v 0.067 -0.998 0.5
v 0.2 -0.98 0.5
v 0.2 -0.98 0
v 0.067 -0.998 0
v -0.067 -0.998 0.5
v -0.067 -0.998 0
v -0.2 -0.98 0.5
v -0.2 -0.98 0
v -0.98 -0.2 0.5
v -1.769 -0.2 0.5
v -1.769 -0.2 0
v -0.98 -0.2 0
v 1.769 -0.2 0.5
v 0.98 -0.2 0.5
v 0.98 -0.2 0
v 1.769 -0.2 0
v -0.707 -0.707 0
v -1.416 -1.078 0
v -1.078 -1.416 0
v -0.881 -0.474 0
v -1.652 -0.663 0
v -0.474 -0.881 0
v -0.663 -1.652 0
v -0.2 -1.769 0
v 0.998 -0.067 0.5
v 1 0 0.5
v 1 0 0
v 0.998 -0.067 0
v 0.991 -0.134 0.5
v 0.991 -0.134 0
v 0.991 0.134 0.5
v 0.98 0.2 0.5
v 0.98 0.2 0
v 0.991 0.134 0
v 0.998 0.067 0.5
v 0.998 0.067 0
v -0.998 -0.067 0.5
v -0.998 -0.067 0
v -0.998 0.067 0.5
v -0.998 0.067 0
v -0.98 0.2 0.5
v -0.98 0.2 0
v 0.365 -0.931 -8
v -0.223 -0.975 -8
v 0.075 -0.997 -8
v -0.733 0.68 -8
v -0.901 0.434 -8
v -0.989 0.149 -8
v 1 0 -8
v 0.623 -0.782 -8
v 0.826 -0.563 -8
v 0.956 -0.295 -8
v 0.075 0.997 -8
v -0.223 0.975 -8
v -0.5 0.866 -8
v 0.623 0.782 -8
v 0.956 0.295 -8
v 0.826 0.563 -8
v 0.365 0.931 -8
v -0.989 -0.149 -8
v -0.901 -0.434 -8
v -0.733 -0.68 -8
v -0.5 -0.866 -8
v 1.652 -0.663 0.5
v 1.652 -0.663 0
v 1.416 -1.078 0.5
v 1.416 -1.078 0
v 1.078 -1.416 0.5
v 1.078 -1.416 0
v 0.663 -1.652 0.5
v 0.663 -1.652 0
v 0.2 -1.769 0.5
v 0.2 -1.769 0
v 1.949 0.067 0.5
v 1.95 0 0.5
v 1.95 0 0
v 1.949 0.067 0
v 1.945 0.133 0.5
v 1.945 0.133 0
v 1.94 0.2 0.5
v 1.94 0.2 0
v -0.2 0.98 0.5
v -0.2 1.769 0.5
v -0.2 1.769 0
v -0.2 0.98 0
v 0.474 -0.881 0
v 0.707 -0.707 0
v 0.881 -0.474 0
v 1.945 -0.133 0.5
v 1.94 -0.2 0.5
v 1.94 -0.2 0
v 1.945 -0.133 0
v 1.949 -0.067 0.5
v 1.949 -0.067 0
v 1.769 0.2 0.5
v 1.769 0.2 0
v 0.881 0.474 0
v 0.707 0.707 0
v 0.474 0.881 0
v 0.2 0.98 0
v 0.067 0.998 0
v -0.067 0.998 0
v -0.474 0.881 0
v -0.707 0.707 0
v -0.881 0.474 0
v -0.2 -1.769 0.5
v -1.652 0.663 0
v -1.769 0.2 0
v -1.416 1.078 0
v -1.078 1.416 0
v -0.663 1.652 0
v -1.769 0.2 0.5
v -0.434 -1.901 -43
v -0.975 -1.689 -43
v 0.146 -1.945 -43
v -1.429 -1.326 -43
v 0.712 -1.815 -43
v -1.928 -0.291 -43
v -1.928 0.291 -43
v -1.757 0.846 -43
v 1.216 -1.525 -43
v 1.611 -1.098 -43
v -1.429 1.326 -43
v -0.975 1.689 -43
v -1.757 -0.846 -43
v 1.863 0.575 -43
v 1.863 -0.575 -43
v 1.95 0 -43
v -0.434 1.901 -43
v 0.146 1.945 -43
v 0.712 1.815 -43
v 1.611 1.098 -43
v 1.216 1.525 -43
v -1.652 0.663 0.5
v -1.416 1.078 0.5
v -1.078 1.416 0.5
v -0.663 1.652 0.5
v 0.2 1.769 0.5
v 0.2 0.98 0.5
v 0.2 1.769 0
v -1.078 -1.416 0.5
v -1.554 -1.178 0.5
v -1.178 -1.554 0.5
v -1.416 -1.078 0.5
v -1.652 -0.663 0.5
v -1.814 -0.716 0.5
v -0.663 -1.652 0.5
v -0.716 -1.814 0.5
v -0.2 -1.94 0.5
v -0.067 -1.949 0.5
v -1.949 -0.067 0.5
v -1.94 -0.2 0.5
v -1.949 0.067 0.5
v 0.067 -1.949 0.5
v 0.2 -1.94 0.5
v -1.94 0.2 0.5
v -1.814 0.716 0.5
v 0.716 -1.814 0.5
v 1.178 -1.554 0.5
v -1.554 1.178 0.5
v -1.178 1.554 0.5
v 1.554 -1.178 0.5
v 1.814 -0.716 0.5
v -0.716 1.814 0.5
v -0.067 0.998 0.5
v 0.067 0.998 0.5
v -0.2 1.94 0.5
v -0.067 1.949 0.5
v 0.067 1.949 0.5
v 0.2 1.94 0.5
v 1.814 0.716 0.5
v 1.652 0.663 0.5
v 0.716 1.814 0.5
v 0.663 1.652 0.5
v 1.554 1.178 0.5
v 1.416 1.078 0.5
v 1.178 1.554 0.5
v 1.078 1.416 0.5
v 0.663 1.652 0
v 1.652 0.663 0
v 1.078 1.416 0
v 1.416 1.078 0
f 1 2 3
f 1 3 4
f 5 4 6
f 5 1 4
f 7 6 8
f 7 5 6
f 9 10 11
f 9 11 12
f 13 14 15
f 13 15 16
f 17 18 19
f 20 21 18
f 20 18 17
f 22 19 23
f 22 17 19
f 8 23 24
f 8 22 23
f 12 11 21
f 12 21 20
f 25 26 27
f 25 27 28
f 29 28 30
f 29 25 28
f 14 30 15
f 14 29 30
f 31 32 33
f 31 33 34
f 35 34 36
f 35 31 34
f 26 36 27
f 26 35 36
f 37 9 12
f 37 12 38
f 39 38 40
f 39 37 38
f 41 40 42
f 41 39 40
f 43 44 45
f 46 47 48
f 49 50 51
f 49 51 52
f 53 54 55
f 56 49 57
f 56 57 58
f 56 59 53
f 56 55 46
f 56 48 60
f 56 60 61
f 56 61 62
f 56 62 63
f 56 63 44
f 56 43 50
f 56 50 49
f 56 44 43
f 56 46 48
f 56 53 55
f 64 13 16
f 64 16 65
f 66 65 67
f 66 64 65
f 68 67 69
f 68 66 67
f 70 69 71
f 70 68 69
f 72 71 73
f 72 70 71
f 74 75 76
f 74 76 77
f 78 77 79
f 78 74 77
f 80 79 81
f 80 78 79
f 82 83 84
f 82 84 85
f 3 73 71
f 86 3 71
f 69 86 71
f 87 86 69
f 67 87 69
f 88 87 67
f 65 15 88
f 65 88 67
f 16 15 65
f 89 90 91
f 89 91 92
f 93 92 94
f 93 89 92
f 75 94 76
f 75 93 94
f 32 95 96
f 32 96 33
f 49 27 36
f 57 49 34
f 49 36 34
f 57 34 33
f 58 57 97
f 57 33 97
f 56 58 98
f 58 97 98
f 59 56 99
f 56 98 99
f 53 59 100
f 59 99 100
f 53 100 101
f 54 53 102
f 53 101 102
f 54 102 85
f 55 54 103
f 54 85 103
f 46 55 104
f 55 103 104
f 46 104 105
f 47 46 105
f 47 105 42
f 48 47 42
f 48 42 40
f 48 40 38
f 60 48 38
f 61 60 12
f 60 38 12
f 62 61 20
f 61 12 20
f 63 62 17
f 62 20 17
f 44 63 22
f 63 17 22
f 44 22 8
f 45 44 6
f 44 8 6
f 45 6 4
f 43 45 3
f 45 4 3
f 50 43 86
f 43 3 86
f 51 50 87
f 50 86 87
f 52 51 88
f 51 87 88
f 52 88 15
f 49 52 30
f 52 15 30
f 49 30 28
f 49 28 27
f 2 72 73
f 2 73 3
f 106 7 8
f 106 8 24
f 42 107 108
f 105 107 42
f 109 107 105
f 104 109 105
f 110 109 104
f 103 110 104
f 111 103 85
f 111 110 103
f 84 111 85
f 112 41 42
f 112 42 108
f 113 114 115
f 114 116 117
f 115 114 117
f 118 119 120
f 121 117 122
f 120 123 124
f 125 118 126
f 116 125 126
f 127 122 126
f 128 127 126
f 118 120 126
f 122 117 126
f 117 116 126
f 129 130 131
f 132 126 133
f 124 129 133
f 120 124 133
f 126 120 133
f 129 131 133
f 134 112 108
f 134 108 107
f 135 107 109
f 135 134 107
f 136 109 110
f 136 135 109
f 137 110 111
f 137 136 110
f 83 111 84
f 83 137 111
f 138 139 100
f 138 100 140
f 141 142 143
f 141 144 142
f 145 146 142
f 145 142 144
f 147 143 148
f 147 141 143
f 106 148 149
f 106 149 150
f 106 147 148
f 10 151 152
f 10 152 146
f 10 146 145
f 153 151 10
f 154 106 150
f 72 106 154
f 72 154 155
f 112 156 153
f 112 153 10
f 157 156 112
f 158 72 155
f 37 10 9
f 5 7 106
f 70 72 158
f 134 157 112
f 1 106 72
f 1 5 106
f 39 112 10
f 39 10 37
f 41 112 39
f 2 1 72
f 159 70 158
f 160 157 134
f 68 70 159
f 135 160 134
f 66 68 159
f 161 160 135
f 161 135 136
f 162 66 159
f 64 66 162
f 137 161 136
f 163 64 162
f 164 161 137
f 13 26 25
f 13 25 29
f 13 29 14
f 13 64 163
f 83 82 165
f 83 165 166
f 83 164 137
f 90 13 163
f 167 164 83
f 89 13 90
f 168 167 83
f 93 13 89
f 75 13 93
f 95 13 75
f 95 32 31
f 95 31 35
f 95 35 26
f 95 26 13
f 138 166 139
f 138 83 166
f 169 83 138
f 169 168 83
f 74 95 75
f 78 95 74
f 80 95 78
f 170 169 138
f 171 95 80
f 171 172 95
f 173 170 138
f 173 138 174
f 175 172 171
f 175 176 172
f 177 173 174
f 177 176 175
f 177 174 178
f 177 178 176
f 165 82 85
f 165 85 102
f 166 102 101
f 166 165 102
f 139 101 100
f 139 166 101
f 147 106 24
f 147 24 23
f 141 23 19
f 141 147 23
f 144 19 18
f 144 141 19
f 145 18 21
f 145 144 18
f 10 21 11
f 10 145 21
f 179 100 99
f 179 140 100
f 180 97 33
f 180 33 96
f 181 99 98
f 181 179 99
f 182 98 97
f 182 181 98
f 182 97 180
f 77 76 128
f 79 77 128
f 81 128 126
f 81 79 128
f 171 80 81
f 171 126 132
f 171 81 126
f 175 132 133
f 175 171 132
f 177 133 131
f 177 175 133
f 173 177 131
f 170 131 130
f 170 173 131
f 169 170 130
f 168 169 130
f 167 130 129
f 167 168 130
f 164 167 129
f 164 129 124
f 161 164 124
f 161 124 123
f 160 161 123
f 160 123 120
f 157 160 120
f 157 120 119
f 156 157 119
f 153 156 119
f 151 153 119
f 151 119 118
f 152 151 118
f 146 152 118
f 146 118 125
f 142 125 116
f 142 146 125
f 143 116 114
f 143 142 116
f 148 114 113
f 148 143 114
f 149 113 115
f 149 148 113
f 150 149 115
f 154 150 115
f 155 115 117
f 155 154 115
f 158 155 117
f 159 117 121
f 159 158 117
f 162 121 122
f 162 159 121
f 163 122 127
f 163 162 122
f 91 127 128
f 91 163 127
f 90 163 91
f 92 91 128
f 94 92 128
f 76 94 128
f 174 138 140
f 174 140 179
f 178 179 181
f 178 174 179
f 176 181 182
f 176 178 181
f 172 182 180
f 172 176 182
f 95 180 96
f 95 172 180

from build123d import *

# Parameters (mm, degrees)
SKETCH_1_R          = 1.95
EXTRUDE_1_DEPTH     = 43
SKETCH_3_R          = 1
CUT_EXTRUDE_1_DEPTH = 8
EXTRUDE_START       = 0.5
EXTRUDE_3_DEPTH     = 0.5


with BuildPart() as part:
    # 草图1 → 凸台-拉伸1 (new body)
    with BuildSketch(Plane.XY):
        Circle(SKETCH_1_R)
    extrude(amount=-EXTRUDE_1_DEPTH)

    # 草图3 → 切除-拉伸1 (cut)
    with BuildSketch(Plane.XY):
        Circle(SKETCH_3_R)
    extrude(amount=-CUT_EXTRUDE_1_DEPTH, mode=Mode.SUBTRACT)

    # 草图4 → 凸台-拉伸3 (add)
    with BuildSketch(Plane.XY.offset(EXTRUDE_START)):
        with BuildLine():
            Line((-1.768728357, 0.2), (-1.939716474, 0.2))
            ThreePointArc((-1.939716474, 0.2), (-1.95, 0), (-1.939716474, -0.2))
            Line((-1.939716474, -0.2), (-1.768728357, -0.2))
            ThreePointArc((-1.768728357, -0.2), (-1.78, 0), (-1.768728357, 0.2))
        make_face()
        with BuildLine():
            ThreePointArc((1.95, 0), (1.947427422, 0.100132101), (1.939716474, 0.2))
            Line((1.939716474, 0.2), (1.768728357, 0.2))
            ThreePointArc((1.768728357, 0.2), (1.777179855, 0.100158687), (1.78, 0))
            ThreePointArc((1.78, 0), (1.777179855, -0.100158687), (1.768728357, -0.2))
            Line((1.768728357, -0.2), (1.939716474, -0.2))
            ThreePointArc((1.939716474, -0.2), (1.947427422, -0.100132101), (1.95, 0))
        make_face()
        with BuildLine():
            Line((0.2, -1.768728357), (0.2, -1.939716474))
            ThreePointArc((0.2, -1.939716474), (1.378858223, -1.378858223), (1.939716474, -0.2))
            Line((1.939716474, -0.2), (1.768728357, -0.2))
            ThreePointArc((1.768728357, -0.2), (1.258650071, -1.258650071), (0.2, -1.768728357))
        make_face()
        with BuildLine():
            Line((-0.2, -1.768728357), (-0.2, -1.939716474))
            ThreePointArc((-0.2, -1.939716474), (0, -1.95), (0.2, -1.939716474))
            Line((0.2, -1.939716474), (0.2, -1.768728357))
            ThreePointArc((0.2, -1.768728357), (0, -1.78), (-0.2, -1.768728357))
        make_face()
        with BuildLine():
            Line((-1.768728357, -0.2), (-1.939716474, -0.2))
            ThreePointArc((-1.939716474, -0.2), (-1.378858223, -1.378858223), (-0.2, -1.939716474))
            Line((-0.2, -1.939716474), (-0.2, -1.768728357))
            ThreePointArc((-0.2, -1.768728357), (-1.258650071, -1.258650071), (-1.768728357, -0.2))
        make_face()
        with BuildLine():
            ThreePointArc((-0.2, 1.939716474), (-1.378858223, 1.378858223), (-1.939716474, 0.2))
            Line((-1.939716474, 0.2), (-1.768728357, 0.2))
            ThreePointArc((-1.768728357, 0.2), (-1.258650071, 1.258650071), (-0.2, 1.768728357))
            Line((-0.2, 1.768728357), (-0.2, 1.939716474))
        make_face()
        with BuildLine():
            ThreePointArc((1.939716474, 0.2), (1.378858223, 1.378858223), (0.2, 1.939716474))
            Line((0.2, 1.939716474), (0.2, 1.768728357))
            ThreePointArc((0.2, 1.768728357), (1.258650071, 1.258650071), (1.768728357, 0.2))
            Line((1.768728357, 0.2), (1.939716474, 0.2))
        make_face()
        with BuildLine():
            ThreePointArc((0.2, 1.939716474), (0, 1.95), (-0.2, 1.939716474))
            Line((-0.2, 1.939716474), (-0.2, 1.768728357))
            ThreePointArc((-0.2, 1.768728357), (0, 1.78), (0.2, 1.768728357))
            Line((0.2, 1.768728357), (0.2, 1.939716474))
        make_face()
        with BuildLine():
            Line((-0.979795897, 0.2), (-1.768728357, 0.2))
            ThreePointArc((-1.768728357, 0.2), (-1.78, 0), (-1.768728357, -0.2))
            Line((-1.768728357, -0.2), (-0.979795897, -0.2))
            ThreePointArc((-0.979795897, -0.2), (-1, 0), (-0.979795897, 0.2))
        make_face()
        with BuildLine():
            ThreePointArc((1.78, 0), (1.777179855, 0.100158687), (1.768728357, 0.2))
            Line((1.768728357, 0.2), (0.979795897, 0.2))
            ThreePointArc((0.979795897, 0.2), (0.994936153, 0.100508962), (1, 0))
            ThreePointArc((1, 0), (0.994936153, -0.100508962), (0.979795897, -0.2))
            Line((0.979795897, -0.2), (1.768728357, -0.2))
            ThreePointArc((1.768728357, -0.2), (1.777179855, -0.100158687), (1.78, 0))
        make_face()
        with BuildLine():
            ThreePointArc((0.2, 1.768728357), (0, 1.78), (-0.2, 1.768728357))
            Line((-0.2, 1.768728357), (-0.2, 0.979795897))
            ThreePointArc((-0.2, 0.979795897), (0, 1), (0.2, 0.979795897))
            Line((0.2, 0.979795897), (0.2, 1.768728357))
        make_face()
        with BuildLine():
            Line((-0.2, -0.979795897), (-0.2, -1.768728357))
            ThreePointArc((-0.2, -1.768728357), (0, -1.78), (0.2, -1.768728357))
            Line((0.2, -1.768728357), (0.2, -0.979795897))
            ThreePointArc((0.2, -0.979795897), (0, -1), (-0.2, -0.979795897))
        make_face()
    extrude(amount=-EXTRUDE_3_DEPTH)


solid = part.part
